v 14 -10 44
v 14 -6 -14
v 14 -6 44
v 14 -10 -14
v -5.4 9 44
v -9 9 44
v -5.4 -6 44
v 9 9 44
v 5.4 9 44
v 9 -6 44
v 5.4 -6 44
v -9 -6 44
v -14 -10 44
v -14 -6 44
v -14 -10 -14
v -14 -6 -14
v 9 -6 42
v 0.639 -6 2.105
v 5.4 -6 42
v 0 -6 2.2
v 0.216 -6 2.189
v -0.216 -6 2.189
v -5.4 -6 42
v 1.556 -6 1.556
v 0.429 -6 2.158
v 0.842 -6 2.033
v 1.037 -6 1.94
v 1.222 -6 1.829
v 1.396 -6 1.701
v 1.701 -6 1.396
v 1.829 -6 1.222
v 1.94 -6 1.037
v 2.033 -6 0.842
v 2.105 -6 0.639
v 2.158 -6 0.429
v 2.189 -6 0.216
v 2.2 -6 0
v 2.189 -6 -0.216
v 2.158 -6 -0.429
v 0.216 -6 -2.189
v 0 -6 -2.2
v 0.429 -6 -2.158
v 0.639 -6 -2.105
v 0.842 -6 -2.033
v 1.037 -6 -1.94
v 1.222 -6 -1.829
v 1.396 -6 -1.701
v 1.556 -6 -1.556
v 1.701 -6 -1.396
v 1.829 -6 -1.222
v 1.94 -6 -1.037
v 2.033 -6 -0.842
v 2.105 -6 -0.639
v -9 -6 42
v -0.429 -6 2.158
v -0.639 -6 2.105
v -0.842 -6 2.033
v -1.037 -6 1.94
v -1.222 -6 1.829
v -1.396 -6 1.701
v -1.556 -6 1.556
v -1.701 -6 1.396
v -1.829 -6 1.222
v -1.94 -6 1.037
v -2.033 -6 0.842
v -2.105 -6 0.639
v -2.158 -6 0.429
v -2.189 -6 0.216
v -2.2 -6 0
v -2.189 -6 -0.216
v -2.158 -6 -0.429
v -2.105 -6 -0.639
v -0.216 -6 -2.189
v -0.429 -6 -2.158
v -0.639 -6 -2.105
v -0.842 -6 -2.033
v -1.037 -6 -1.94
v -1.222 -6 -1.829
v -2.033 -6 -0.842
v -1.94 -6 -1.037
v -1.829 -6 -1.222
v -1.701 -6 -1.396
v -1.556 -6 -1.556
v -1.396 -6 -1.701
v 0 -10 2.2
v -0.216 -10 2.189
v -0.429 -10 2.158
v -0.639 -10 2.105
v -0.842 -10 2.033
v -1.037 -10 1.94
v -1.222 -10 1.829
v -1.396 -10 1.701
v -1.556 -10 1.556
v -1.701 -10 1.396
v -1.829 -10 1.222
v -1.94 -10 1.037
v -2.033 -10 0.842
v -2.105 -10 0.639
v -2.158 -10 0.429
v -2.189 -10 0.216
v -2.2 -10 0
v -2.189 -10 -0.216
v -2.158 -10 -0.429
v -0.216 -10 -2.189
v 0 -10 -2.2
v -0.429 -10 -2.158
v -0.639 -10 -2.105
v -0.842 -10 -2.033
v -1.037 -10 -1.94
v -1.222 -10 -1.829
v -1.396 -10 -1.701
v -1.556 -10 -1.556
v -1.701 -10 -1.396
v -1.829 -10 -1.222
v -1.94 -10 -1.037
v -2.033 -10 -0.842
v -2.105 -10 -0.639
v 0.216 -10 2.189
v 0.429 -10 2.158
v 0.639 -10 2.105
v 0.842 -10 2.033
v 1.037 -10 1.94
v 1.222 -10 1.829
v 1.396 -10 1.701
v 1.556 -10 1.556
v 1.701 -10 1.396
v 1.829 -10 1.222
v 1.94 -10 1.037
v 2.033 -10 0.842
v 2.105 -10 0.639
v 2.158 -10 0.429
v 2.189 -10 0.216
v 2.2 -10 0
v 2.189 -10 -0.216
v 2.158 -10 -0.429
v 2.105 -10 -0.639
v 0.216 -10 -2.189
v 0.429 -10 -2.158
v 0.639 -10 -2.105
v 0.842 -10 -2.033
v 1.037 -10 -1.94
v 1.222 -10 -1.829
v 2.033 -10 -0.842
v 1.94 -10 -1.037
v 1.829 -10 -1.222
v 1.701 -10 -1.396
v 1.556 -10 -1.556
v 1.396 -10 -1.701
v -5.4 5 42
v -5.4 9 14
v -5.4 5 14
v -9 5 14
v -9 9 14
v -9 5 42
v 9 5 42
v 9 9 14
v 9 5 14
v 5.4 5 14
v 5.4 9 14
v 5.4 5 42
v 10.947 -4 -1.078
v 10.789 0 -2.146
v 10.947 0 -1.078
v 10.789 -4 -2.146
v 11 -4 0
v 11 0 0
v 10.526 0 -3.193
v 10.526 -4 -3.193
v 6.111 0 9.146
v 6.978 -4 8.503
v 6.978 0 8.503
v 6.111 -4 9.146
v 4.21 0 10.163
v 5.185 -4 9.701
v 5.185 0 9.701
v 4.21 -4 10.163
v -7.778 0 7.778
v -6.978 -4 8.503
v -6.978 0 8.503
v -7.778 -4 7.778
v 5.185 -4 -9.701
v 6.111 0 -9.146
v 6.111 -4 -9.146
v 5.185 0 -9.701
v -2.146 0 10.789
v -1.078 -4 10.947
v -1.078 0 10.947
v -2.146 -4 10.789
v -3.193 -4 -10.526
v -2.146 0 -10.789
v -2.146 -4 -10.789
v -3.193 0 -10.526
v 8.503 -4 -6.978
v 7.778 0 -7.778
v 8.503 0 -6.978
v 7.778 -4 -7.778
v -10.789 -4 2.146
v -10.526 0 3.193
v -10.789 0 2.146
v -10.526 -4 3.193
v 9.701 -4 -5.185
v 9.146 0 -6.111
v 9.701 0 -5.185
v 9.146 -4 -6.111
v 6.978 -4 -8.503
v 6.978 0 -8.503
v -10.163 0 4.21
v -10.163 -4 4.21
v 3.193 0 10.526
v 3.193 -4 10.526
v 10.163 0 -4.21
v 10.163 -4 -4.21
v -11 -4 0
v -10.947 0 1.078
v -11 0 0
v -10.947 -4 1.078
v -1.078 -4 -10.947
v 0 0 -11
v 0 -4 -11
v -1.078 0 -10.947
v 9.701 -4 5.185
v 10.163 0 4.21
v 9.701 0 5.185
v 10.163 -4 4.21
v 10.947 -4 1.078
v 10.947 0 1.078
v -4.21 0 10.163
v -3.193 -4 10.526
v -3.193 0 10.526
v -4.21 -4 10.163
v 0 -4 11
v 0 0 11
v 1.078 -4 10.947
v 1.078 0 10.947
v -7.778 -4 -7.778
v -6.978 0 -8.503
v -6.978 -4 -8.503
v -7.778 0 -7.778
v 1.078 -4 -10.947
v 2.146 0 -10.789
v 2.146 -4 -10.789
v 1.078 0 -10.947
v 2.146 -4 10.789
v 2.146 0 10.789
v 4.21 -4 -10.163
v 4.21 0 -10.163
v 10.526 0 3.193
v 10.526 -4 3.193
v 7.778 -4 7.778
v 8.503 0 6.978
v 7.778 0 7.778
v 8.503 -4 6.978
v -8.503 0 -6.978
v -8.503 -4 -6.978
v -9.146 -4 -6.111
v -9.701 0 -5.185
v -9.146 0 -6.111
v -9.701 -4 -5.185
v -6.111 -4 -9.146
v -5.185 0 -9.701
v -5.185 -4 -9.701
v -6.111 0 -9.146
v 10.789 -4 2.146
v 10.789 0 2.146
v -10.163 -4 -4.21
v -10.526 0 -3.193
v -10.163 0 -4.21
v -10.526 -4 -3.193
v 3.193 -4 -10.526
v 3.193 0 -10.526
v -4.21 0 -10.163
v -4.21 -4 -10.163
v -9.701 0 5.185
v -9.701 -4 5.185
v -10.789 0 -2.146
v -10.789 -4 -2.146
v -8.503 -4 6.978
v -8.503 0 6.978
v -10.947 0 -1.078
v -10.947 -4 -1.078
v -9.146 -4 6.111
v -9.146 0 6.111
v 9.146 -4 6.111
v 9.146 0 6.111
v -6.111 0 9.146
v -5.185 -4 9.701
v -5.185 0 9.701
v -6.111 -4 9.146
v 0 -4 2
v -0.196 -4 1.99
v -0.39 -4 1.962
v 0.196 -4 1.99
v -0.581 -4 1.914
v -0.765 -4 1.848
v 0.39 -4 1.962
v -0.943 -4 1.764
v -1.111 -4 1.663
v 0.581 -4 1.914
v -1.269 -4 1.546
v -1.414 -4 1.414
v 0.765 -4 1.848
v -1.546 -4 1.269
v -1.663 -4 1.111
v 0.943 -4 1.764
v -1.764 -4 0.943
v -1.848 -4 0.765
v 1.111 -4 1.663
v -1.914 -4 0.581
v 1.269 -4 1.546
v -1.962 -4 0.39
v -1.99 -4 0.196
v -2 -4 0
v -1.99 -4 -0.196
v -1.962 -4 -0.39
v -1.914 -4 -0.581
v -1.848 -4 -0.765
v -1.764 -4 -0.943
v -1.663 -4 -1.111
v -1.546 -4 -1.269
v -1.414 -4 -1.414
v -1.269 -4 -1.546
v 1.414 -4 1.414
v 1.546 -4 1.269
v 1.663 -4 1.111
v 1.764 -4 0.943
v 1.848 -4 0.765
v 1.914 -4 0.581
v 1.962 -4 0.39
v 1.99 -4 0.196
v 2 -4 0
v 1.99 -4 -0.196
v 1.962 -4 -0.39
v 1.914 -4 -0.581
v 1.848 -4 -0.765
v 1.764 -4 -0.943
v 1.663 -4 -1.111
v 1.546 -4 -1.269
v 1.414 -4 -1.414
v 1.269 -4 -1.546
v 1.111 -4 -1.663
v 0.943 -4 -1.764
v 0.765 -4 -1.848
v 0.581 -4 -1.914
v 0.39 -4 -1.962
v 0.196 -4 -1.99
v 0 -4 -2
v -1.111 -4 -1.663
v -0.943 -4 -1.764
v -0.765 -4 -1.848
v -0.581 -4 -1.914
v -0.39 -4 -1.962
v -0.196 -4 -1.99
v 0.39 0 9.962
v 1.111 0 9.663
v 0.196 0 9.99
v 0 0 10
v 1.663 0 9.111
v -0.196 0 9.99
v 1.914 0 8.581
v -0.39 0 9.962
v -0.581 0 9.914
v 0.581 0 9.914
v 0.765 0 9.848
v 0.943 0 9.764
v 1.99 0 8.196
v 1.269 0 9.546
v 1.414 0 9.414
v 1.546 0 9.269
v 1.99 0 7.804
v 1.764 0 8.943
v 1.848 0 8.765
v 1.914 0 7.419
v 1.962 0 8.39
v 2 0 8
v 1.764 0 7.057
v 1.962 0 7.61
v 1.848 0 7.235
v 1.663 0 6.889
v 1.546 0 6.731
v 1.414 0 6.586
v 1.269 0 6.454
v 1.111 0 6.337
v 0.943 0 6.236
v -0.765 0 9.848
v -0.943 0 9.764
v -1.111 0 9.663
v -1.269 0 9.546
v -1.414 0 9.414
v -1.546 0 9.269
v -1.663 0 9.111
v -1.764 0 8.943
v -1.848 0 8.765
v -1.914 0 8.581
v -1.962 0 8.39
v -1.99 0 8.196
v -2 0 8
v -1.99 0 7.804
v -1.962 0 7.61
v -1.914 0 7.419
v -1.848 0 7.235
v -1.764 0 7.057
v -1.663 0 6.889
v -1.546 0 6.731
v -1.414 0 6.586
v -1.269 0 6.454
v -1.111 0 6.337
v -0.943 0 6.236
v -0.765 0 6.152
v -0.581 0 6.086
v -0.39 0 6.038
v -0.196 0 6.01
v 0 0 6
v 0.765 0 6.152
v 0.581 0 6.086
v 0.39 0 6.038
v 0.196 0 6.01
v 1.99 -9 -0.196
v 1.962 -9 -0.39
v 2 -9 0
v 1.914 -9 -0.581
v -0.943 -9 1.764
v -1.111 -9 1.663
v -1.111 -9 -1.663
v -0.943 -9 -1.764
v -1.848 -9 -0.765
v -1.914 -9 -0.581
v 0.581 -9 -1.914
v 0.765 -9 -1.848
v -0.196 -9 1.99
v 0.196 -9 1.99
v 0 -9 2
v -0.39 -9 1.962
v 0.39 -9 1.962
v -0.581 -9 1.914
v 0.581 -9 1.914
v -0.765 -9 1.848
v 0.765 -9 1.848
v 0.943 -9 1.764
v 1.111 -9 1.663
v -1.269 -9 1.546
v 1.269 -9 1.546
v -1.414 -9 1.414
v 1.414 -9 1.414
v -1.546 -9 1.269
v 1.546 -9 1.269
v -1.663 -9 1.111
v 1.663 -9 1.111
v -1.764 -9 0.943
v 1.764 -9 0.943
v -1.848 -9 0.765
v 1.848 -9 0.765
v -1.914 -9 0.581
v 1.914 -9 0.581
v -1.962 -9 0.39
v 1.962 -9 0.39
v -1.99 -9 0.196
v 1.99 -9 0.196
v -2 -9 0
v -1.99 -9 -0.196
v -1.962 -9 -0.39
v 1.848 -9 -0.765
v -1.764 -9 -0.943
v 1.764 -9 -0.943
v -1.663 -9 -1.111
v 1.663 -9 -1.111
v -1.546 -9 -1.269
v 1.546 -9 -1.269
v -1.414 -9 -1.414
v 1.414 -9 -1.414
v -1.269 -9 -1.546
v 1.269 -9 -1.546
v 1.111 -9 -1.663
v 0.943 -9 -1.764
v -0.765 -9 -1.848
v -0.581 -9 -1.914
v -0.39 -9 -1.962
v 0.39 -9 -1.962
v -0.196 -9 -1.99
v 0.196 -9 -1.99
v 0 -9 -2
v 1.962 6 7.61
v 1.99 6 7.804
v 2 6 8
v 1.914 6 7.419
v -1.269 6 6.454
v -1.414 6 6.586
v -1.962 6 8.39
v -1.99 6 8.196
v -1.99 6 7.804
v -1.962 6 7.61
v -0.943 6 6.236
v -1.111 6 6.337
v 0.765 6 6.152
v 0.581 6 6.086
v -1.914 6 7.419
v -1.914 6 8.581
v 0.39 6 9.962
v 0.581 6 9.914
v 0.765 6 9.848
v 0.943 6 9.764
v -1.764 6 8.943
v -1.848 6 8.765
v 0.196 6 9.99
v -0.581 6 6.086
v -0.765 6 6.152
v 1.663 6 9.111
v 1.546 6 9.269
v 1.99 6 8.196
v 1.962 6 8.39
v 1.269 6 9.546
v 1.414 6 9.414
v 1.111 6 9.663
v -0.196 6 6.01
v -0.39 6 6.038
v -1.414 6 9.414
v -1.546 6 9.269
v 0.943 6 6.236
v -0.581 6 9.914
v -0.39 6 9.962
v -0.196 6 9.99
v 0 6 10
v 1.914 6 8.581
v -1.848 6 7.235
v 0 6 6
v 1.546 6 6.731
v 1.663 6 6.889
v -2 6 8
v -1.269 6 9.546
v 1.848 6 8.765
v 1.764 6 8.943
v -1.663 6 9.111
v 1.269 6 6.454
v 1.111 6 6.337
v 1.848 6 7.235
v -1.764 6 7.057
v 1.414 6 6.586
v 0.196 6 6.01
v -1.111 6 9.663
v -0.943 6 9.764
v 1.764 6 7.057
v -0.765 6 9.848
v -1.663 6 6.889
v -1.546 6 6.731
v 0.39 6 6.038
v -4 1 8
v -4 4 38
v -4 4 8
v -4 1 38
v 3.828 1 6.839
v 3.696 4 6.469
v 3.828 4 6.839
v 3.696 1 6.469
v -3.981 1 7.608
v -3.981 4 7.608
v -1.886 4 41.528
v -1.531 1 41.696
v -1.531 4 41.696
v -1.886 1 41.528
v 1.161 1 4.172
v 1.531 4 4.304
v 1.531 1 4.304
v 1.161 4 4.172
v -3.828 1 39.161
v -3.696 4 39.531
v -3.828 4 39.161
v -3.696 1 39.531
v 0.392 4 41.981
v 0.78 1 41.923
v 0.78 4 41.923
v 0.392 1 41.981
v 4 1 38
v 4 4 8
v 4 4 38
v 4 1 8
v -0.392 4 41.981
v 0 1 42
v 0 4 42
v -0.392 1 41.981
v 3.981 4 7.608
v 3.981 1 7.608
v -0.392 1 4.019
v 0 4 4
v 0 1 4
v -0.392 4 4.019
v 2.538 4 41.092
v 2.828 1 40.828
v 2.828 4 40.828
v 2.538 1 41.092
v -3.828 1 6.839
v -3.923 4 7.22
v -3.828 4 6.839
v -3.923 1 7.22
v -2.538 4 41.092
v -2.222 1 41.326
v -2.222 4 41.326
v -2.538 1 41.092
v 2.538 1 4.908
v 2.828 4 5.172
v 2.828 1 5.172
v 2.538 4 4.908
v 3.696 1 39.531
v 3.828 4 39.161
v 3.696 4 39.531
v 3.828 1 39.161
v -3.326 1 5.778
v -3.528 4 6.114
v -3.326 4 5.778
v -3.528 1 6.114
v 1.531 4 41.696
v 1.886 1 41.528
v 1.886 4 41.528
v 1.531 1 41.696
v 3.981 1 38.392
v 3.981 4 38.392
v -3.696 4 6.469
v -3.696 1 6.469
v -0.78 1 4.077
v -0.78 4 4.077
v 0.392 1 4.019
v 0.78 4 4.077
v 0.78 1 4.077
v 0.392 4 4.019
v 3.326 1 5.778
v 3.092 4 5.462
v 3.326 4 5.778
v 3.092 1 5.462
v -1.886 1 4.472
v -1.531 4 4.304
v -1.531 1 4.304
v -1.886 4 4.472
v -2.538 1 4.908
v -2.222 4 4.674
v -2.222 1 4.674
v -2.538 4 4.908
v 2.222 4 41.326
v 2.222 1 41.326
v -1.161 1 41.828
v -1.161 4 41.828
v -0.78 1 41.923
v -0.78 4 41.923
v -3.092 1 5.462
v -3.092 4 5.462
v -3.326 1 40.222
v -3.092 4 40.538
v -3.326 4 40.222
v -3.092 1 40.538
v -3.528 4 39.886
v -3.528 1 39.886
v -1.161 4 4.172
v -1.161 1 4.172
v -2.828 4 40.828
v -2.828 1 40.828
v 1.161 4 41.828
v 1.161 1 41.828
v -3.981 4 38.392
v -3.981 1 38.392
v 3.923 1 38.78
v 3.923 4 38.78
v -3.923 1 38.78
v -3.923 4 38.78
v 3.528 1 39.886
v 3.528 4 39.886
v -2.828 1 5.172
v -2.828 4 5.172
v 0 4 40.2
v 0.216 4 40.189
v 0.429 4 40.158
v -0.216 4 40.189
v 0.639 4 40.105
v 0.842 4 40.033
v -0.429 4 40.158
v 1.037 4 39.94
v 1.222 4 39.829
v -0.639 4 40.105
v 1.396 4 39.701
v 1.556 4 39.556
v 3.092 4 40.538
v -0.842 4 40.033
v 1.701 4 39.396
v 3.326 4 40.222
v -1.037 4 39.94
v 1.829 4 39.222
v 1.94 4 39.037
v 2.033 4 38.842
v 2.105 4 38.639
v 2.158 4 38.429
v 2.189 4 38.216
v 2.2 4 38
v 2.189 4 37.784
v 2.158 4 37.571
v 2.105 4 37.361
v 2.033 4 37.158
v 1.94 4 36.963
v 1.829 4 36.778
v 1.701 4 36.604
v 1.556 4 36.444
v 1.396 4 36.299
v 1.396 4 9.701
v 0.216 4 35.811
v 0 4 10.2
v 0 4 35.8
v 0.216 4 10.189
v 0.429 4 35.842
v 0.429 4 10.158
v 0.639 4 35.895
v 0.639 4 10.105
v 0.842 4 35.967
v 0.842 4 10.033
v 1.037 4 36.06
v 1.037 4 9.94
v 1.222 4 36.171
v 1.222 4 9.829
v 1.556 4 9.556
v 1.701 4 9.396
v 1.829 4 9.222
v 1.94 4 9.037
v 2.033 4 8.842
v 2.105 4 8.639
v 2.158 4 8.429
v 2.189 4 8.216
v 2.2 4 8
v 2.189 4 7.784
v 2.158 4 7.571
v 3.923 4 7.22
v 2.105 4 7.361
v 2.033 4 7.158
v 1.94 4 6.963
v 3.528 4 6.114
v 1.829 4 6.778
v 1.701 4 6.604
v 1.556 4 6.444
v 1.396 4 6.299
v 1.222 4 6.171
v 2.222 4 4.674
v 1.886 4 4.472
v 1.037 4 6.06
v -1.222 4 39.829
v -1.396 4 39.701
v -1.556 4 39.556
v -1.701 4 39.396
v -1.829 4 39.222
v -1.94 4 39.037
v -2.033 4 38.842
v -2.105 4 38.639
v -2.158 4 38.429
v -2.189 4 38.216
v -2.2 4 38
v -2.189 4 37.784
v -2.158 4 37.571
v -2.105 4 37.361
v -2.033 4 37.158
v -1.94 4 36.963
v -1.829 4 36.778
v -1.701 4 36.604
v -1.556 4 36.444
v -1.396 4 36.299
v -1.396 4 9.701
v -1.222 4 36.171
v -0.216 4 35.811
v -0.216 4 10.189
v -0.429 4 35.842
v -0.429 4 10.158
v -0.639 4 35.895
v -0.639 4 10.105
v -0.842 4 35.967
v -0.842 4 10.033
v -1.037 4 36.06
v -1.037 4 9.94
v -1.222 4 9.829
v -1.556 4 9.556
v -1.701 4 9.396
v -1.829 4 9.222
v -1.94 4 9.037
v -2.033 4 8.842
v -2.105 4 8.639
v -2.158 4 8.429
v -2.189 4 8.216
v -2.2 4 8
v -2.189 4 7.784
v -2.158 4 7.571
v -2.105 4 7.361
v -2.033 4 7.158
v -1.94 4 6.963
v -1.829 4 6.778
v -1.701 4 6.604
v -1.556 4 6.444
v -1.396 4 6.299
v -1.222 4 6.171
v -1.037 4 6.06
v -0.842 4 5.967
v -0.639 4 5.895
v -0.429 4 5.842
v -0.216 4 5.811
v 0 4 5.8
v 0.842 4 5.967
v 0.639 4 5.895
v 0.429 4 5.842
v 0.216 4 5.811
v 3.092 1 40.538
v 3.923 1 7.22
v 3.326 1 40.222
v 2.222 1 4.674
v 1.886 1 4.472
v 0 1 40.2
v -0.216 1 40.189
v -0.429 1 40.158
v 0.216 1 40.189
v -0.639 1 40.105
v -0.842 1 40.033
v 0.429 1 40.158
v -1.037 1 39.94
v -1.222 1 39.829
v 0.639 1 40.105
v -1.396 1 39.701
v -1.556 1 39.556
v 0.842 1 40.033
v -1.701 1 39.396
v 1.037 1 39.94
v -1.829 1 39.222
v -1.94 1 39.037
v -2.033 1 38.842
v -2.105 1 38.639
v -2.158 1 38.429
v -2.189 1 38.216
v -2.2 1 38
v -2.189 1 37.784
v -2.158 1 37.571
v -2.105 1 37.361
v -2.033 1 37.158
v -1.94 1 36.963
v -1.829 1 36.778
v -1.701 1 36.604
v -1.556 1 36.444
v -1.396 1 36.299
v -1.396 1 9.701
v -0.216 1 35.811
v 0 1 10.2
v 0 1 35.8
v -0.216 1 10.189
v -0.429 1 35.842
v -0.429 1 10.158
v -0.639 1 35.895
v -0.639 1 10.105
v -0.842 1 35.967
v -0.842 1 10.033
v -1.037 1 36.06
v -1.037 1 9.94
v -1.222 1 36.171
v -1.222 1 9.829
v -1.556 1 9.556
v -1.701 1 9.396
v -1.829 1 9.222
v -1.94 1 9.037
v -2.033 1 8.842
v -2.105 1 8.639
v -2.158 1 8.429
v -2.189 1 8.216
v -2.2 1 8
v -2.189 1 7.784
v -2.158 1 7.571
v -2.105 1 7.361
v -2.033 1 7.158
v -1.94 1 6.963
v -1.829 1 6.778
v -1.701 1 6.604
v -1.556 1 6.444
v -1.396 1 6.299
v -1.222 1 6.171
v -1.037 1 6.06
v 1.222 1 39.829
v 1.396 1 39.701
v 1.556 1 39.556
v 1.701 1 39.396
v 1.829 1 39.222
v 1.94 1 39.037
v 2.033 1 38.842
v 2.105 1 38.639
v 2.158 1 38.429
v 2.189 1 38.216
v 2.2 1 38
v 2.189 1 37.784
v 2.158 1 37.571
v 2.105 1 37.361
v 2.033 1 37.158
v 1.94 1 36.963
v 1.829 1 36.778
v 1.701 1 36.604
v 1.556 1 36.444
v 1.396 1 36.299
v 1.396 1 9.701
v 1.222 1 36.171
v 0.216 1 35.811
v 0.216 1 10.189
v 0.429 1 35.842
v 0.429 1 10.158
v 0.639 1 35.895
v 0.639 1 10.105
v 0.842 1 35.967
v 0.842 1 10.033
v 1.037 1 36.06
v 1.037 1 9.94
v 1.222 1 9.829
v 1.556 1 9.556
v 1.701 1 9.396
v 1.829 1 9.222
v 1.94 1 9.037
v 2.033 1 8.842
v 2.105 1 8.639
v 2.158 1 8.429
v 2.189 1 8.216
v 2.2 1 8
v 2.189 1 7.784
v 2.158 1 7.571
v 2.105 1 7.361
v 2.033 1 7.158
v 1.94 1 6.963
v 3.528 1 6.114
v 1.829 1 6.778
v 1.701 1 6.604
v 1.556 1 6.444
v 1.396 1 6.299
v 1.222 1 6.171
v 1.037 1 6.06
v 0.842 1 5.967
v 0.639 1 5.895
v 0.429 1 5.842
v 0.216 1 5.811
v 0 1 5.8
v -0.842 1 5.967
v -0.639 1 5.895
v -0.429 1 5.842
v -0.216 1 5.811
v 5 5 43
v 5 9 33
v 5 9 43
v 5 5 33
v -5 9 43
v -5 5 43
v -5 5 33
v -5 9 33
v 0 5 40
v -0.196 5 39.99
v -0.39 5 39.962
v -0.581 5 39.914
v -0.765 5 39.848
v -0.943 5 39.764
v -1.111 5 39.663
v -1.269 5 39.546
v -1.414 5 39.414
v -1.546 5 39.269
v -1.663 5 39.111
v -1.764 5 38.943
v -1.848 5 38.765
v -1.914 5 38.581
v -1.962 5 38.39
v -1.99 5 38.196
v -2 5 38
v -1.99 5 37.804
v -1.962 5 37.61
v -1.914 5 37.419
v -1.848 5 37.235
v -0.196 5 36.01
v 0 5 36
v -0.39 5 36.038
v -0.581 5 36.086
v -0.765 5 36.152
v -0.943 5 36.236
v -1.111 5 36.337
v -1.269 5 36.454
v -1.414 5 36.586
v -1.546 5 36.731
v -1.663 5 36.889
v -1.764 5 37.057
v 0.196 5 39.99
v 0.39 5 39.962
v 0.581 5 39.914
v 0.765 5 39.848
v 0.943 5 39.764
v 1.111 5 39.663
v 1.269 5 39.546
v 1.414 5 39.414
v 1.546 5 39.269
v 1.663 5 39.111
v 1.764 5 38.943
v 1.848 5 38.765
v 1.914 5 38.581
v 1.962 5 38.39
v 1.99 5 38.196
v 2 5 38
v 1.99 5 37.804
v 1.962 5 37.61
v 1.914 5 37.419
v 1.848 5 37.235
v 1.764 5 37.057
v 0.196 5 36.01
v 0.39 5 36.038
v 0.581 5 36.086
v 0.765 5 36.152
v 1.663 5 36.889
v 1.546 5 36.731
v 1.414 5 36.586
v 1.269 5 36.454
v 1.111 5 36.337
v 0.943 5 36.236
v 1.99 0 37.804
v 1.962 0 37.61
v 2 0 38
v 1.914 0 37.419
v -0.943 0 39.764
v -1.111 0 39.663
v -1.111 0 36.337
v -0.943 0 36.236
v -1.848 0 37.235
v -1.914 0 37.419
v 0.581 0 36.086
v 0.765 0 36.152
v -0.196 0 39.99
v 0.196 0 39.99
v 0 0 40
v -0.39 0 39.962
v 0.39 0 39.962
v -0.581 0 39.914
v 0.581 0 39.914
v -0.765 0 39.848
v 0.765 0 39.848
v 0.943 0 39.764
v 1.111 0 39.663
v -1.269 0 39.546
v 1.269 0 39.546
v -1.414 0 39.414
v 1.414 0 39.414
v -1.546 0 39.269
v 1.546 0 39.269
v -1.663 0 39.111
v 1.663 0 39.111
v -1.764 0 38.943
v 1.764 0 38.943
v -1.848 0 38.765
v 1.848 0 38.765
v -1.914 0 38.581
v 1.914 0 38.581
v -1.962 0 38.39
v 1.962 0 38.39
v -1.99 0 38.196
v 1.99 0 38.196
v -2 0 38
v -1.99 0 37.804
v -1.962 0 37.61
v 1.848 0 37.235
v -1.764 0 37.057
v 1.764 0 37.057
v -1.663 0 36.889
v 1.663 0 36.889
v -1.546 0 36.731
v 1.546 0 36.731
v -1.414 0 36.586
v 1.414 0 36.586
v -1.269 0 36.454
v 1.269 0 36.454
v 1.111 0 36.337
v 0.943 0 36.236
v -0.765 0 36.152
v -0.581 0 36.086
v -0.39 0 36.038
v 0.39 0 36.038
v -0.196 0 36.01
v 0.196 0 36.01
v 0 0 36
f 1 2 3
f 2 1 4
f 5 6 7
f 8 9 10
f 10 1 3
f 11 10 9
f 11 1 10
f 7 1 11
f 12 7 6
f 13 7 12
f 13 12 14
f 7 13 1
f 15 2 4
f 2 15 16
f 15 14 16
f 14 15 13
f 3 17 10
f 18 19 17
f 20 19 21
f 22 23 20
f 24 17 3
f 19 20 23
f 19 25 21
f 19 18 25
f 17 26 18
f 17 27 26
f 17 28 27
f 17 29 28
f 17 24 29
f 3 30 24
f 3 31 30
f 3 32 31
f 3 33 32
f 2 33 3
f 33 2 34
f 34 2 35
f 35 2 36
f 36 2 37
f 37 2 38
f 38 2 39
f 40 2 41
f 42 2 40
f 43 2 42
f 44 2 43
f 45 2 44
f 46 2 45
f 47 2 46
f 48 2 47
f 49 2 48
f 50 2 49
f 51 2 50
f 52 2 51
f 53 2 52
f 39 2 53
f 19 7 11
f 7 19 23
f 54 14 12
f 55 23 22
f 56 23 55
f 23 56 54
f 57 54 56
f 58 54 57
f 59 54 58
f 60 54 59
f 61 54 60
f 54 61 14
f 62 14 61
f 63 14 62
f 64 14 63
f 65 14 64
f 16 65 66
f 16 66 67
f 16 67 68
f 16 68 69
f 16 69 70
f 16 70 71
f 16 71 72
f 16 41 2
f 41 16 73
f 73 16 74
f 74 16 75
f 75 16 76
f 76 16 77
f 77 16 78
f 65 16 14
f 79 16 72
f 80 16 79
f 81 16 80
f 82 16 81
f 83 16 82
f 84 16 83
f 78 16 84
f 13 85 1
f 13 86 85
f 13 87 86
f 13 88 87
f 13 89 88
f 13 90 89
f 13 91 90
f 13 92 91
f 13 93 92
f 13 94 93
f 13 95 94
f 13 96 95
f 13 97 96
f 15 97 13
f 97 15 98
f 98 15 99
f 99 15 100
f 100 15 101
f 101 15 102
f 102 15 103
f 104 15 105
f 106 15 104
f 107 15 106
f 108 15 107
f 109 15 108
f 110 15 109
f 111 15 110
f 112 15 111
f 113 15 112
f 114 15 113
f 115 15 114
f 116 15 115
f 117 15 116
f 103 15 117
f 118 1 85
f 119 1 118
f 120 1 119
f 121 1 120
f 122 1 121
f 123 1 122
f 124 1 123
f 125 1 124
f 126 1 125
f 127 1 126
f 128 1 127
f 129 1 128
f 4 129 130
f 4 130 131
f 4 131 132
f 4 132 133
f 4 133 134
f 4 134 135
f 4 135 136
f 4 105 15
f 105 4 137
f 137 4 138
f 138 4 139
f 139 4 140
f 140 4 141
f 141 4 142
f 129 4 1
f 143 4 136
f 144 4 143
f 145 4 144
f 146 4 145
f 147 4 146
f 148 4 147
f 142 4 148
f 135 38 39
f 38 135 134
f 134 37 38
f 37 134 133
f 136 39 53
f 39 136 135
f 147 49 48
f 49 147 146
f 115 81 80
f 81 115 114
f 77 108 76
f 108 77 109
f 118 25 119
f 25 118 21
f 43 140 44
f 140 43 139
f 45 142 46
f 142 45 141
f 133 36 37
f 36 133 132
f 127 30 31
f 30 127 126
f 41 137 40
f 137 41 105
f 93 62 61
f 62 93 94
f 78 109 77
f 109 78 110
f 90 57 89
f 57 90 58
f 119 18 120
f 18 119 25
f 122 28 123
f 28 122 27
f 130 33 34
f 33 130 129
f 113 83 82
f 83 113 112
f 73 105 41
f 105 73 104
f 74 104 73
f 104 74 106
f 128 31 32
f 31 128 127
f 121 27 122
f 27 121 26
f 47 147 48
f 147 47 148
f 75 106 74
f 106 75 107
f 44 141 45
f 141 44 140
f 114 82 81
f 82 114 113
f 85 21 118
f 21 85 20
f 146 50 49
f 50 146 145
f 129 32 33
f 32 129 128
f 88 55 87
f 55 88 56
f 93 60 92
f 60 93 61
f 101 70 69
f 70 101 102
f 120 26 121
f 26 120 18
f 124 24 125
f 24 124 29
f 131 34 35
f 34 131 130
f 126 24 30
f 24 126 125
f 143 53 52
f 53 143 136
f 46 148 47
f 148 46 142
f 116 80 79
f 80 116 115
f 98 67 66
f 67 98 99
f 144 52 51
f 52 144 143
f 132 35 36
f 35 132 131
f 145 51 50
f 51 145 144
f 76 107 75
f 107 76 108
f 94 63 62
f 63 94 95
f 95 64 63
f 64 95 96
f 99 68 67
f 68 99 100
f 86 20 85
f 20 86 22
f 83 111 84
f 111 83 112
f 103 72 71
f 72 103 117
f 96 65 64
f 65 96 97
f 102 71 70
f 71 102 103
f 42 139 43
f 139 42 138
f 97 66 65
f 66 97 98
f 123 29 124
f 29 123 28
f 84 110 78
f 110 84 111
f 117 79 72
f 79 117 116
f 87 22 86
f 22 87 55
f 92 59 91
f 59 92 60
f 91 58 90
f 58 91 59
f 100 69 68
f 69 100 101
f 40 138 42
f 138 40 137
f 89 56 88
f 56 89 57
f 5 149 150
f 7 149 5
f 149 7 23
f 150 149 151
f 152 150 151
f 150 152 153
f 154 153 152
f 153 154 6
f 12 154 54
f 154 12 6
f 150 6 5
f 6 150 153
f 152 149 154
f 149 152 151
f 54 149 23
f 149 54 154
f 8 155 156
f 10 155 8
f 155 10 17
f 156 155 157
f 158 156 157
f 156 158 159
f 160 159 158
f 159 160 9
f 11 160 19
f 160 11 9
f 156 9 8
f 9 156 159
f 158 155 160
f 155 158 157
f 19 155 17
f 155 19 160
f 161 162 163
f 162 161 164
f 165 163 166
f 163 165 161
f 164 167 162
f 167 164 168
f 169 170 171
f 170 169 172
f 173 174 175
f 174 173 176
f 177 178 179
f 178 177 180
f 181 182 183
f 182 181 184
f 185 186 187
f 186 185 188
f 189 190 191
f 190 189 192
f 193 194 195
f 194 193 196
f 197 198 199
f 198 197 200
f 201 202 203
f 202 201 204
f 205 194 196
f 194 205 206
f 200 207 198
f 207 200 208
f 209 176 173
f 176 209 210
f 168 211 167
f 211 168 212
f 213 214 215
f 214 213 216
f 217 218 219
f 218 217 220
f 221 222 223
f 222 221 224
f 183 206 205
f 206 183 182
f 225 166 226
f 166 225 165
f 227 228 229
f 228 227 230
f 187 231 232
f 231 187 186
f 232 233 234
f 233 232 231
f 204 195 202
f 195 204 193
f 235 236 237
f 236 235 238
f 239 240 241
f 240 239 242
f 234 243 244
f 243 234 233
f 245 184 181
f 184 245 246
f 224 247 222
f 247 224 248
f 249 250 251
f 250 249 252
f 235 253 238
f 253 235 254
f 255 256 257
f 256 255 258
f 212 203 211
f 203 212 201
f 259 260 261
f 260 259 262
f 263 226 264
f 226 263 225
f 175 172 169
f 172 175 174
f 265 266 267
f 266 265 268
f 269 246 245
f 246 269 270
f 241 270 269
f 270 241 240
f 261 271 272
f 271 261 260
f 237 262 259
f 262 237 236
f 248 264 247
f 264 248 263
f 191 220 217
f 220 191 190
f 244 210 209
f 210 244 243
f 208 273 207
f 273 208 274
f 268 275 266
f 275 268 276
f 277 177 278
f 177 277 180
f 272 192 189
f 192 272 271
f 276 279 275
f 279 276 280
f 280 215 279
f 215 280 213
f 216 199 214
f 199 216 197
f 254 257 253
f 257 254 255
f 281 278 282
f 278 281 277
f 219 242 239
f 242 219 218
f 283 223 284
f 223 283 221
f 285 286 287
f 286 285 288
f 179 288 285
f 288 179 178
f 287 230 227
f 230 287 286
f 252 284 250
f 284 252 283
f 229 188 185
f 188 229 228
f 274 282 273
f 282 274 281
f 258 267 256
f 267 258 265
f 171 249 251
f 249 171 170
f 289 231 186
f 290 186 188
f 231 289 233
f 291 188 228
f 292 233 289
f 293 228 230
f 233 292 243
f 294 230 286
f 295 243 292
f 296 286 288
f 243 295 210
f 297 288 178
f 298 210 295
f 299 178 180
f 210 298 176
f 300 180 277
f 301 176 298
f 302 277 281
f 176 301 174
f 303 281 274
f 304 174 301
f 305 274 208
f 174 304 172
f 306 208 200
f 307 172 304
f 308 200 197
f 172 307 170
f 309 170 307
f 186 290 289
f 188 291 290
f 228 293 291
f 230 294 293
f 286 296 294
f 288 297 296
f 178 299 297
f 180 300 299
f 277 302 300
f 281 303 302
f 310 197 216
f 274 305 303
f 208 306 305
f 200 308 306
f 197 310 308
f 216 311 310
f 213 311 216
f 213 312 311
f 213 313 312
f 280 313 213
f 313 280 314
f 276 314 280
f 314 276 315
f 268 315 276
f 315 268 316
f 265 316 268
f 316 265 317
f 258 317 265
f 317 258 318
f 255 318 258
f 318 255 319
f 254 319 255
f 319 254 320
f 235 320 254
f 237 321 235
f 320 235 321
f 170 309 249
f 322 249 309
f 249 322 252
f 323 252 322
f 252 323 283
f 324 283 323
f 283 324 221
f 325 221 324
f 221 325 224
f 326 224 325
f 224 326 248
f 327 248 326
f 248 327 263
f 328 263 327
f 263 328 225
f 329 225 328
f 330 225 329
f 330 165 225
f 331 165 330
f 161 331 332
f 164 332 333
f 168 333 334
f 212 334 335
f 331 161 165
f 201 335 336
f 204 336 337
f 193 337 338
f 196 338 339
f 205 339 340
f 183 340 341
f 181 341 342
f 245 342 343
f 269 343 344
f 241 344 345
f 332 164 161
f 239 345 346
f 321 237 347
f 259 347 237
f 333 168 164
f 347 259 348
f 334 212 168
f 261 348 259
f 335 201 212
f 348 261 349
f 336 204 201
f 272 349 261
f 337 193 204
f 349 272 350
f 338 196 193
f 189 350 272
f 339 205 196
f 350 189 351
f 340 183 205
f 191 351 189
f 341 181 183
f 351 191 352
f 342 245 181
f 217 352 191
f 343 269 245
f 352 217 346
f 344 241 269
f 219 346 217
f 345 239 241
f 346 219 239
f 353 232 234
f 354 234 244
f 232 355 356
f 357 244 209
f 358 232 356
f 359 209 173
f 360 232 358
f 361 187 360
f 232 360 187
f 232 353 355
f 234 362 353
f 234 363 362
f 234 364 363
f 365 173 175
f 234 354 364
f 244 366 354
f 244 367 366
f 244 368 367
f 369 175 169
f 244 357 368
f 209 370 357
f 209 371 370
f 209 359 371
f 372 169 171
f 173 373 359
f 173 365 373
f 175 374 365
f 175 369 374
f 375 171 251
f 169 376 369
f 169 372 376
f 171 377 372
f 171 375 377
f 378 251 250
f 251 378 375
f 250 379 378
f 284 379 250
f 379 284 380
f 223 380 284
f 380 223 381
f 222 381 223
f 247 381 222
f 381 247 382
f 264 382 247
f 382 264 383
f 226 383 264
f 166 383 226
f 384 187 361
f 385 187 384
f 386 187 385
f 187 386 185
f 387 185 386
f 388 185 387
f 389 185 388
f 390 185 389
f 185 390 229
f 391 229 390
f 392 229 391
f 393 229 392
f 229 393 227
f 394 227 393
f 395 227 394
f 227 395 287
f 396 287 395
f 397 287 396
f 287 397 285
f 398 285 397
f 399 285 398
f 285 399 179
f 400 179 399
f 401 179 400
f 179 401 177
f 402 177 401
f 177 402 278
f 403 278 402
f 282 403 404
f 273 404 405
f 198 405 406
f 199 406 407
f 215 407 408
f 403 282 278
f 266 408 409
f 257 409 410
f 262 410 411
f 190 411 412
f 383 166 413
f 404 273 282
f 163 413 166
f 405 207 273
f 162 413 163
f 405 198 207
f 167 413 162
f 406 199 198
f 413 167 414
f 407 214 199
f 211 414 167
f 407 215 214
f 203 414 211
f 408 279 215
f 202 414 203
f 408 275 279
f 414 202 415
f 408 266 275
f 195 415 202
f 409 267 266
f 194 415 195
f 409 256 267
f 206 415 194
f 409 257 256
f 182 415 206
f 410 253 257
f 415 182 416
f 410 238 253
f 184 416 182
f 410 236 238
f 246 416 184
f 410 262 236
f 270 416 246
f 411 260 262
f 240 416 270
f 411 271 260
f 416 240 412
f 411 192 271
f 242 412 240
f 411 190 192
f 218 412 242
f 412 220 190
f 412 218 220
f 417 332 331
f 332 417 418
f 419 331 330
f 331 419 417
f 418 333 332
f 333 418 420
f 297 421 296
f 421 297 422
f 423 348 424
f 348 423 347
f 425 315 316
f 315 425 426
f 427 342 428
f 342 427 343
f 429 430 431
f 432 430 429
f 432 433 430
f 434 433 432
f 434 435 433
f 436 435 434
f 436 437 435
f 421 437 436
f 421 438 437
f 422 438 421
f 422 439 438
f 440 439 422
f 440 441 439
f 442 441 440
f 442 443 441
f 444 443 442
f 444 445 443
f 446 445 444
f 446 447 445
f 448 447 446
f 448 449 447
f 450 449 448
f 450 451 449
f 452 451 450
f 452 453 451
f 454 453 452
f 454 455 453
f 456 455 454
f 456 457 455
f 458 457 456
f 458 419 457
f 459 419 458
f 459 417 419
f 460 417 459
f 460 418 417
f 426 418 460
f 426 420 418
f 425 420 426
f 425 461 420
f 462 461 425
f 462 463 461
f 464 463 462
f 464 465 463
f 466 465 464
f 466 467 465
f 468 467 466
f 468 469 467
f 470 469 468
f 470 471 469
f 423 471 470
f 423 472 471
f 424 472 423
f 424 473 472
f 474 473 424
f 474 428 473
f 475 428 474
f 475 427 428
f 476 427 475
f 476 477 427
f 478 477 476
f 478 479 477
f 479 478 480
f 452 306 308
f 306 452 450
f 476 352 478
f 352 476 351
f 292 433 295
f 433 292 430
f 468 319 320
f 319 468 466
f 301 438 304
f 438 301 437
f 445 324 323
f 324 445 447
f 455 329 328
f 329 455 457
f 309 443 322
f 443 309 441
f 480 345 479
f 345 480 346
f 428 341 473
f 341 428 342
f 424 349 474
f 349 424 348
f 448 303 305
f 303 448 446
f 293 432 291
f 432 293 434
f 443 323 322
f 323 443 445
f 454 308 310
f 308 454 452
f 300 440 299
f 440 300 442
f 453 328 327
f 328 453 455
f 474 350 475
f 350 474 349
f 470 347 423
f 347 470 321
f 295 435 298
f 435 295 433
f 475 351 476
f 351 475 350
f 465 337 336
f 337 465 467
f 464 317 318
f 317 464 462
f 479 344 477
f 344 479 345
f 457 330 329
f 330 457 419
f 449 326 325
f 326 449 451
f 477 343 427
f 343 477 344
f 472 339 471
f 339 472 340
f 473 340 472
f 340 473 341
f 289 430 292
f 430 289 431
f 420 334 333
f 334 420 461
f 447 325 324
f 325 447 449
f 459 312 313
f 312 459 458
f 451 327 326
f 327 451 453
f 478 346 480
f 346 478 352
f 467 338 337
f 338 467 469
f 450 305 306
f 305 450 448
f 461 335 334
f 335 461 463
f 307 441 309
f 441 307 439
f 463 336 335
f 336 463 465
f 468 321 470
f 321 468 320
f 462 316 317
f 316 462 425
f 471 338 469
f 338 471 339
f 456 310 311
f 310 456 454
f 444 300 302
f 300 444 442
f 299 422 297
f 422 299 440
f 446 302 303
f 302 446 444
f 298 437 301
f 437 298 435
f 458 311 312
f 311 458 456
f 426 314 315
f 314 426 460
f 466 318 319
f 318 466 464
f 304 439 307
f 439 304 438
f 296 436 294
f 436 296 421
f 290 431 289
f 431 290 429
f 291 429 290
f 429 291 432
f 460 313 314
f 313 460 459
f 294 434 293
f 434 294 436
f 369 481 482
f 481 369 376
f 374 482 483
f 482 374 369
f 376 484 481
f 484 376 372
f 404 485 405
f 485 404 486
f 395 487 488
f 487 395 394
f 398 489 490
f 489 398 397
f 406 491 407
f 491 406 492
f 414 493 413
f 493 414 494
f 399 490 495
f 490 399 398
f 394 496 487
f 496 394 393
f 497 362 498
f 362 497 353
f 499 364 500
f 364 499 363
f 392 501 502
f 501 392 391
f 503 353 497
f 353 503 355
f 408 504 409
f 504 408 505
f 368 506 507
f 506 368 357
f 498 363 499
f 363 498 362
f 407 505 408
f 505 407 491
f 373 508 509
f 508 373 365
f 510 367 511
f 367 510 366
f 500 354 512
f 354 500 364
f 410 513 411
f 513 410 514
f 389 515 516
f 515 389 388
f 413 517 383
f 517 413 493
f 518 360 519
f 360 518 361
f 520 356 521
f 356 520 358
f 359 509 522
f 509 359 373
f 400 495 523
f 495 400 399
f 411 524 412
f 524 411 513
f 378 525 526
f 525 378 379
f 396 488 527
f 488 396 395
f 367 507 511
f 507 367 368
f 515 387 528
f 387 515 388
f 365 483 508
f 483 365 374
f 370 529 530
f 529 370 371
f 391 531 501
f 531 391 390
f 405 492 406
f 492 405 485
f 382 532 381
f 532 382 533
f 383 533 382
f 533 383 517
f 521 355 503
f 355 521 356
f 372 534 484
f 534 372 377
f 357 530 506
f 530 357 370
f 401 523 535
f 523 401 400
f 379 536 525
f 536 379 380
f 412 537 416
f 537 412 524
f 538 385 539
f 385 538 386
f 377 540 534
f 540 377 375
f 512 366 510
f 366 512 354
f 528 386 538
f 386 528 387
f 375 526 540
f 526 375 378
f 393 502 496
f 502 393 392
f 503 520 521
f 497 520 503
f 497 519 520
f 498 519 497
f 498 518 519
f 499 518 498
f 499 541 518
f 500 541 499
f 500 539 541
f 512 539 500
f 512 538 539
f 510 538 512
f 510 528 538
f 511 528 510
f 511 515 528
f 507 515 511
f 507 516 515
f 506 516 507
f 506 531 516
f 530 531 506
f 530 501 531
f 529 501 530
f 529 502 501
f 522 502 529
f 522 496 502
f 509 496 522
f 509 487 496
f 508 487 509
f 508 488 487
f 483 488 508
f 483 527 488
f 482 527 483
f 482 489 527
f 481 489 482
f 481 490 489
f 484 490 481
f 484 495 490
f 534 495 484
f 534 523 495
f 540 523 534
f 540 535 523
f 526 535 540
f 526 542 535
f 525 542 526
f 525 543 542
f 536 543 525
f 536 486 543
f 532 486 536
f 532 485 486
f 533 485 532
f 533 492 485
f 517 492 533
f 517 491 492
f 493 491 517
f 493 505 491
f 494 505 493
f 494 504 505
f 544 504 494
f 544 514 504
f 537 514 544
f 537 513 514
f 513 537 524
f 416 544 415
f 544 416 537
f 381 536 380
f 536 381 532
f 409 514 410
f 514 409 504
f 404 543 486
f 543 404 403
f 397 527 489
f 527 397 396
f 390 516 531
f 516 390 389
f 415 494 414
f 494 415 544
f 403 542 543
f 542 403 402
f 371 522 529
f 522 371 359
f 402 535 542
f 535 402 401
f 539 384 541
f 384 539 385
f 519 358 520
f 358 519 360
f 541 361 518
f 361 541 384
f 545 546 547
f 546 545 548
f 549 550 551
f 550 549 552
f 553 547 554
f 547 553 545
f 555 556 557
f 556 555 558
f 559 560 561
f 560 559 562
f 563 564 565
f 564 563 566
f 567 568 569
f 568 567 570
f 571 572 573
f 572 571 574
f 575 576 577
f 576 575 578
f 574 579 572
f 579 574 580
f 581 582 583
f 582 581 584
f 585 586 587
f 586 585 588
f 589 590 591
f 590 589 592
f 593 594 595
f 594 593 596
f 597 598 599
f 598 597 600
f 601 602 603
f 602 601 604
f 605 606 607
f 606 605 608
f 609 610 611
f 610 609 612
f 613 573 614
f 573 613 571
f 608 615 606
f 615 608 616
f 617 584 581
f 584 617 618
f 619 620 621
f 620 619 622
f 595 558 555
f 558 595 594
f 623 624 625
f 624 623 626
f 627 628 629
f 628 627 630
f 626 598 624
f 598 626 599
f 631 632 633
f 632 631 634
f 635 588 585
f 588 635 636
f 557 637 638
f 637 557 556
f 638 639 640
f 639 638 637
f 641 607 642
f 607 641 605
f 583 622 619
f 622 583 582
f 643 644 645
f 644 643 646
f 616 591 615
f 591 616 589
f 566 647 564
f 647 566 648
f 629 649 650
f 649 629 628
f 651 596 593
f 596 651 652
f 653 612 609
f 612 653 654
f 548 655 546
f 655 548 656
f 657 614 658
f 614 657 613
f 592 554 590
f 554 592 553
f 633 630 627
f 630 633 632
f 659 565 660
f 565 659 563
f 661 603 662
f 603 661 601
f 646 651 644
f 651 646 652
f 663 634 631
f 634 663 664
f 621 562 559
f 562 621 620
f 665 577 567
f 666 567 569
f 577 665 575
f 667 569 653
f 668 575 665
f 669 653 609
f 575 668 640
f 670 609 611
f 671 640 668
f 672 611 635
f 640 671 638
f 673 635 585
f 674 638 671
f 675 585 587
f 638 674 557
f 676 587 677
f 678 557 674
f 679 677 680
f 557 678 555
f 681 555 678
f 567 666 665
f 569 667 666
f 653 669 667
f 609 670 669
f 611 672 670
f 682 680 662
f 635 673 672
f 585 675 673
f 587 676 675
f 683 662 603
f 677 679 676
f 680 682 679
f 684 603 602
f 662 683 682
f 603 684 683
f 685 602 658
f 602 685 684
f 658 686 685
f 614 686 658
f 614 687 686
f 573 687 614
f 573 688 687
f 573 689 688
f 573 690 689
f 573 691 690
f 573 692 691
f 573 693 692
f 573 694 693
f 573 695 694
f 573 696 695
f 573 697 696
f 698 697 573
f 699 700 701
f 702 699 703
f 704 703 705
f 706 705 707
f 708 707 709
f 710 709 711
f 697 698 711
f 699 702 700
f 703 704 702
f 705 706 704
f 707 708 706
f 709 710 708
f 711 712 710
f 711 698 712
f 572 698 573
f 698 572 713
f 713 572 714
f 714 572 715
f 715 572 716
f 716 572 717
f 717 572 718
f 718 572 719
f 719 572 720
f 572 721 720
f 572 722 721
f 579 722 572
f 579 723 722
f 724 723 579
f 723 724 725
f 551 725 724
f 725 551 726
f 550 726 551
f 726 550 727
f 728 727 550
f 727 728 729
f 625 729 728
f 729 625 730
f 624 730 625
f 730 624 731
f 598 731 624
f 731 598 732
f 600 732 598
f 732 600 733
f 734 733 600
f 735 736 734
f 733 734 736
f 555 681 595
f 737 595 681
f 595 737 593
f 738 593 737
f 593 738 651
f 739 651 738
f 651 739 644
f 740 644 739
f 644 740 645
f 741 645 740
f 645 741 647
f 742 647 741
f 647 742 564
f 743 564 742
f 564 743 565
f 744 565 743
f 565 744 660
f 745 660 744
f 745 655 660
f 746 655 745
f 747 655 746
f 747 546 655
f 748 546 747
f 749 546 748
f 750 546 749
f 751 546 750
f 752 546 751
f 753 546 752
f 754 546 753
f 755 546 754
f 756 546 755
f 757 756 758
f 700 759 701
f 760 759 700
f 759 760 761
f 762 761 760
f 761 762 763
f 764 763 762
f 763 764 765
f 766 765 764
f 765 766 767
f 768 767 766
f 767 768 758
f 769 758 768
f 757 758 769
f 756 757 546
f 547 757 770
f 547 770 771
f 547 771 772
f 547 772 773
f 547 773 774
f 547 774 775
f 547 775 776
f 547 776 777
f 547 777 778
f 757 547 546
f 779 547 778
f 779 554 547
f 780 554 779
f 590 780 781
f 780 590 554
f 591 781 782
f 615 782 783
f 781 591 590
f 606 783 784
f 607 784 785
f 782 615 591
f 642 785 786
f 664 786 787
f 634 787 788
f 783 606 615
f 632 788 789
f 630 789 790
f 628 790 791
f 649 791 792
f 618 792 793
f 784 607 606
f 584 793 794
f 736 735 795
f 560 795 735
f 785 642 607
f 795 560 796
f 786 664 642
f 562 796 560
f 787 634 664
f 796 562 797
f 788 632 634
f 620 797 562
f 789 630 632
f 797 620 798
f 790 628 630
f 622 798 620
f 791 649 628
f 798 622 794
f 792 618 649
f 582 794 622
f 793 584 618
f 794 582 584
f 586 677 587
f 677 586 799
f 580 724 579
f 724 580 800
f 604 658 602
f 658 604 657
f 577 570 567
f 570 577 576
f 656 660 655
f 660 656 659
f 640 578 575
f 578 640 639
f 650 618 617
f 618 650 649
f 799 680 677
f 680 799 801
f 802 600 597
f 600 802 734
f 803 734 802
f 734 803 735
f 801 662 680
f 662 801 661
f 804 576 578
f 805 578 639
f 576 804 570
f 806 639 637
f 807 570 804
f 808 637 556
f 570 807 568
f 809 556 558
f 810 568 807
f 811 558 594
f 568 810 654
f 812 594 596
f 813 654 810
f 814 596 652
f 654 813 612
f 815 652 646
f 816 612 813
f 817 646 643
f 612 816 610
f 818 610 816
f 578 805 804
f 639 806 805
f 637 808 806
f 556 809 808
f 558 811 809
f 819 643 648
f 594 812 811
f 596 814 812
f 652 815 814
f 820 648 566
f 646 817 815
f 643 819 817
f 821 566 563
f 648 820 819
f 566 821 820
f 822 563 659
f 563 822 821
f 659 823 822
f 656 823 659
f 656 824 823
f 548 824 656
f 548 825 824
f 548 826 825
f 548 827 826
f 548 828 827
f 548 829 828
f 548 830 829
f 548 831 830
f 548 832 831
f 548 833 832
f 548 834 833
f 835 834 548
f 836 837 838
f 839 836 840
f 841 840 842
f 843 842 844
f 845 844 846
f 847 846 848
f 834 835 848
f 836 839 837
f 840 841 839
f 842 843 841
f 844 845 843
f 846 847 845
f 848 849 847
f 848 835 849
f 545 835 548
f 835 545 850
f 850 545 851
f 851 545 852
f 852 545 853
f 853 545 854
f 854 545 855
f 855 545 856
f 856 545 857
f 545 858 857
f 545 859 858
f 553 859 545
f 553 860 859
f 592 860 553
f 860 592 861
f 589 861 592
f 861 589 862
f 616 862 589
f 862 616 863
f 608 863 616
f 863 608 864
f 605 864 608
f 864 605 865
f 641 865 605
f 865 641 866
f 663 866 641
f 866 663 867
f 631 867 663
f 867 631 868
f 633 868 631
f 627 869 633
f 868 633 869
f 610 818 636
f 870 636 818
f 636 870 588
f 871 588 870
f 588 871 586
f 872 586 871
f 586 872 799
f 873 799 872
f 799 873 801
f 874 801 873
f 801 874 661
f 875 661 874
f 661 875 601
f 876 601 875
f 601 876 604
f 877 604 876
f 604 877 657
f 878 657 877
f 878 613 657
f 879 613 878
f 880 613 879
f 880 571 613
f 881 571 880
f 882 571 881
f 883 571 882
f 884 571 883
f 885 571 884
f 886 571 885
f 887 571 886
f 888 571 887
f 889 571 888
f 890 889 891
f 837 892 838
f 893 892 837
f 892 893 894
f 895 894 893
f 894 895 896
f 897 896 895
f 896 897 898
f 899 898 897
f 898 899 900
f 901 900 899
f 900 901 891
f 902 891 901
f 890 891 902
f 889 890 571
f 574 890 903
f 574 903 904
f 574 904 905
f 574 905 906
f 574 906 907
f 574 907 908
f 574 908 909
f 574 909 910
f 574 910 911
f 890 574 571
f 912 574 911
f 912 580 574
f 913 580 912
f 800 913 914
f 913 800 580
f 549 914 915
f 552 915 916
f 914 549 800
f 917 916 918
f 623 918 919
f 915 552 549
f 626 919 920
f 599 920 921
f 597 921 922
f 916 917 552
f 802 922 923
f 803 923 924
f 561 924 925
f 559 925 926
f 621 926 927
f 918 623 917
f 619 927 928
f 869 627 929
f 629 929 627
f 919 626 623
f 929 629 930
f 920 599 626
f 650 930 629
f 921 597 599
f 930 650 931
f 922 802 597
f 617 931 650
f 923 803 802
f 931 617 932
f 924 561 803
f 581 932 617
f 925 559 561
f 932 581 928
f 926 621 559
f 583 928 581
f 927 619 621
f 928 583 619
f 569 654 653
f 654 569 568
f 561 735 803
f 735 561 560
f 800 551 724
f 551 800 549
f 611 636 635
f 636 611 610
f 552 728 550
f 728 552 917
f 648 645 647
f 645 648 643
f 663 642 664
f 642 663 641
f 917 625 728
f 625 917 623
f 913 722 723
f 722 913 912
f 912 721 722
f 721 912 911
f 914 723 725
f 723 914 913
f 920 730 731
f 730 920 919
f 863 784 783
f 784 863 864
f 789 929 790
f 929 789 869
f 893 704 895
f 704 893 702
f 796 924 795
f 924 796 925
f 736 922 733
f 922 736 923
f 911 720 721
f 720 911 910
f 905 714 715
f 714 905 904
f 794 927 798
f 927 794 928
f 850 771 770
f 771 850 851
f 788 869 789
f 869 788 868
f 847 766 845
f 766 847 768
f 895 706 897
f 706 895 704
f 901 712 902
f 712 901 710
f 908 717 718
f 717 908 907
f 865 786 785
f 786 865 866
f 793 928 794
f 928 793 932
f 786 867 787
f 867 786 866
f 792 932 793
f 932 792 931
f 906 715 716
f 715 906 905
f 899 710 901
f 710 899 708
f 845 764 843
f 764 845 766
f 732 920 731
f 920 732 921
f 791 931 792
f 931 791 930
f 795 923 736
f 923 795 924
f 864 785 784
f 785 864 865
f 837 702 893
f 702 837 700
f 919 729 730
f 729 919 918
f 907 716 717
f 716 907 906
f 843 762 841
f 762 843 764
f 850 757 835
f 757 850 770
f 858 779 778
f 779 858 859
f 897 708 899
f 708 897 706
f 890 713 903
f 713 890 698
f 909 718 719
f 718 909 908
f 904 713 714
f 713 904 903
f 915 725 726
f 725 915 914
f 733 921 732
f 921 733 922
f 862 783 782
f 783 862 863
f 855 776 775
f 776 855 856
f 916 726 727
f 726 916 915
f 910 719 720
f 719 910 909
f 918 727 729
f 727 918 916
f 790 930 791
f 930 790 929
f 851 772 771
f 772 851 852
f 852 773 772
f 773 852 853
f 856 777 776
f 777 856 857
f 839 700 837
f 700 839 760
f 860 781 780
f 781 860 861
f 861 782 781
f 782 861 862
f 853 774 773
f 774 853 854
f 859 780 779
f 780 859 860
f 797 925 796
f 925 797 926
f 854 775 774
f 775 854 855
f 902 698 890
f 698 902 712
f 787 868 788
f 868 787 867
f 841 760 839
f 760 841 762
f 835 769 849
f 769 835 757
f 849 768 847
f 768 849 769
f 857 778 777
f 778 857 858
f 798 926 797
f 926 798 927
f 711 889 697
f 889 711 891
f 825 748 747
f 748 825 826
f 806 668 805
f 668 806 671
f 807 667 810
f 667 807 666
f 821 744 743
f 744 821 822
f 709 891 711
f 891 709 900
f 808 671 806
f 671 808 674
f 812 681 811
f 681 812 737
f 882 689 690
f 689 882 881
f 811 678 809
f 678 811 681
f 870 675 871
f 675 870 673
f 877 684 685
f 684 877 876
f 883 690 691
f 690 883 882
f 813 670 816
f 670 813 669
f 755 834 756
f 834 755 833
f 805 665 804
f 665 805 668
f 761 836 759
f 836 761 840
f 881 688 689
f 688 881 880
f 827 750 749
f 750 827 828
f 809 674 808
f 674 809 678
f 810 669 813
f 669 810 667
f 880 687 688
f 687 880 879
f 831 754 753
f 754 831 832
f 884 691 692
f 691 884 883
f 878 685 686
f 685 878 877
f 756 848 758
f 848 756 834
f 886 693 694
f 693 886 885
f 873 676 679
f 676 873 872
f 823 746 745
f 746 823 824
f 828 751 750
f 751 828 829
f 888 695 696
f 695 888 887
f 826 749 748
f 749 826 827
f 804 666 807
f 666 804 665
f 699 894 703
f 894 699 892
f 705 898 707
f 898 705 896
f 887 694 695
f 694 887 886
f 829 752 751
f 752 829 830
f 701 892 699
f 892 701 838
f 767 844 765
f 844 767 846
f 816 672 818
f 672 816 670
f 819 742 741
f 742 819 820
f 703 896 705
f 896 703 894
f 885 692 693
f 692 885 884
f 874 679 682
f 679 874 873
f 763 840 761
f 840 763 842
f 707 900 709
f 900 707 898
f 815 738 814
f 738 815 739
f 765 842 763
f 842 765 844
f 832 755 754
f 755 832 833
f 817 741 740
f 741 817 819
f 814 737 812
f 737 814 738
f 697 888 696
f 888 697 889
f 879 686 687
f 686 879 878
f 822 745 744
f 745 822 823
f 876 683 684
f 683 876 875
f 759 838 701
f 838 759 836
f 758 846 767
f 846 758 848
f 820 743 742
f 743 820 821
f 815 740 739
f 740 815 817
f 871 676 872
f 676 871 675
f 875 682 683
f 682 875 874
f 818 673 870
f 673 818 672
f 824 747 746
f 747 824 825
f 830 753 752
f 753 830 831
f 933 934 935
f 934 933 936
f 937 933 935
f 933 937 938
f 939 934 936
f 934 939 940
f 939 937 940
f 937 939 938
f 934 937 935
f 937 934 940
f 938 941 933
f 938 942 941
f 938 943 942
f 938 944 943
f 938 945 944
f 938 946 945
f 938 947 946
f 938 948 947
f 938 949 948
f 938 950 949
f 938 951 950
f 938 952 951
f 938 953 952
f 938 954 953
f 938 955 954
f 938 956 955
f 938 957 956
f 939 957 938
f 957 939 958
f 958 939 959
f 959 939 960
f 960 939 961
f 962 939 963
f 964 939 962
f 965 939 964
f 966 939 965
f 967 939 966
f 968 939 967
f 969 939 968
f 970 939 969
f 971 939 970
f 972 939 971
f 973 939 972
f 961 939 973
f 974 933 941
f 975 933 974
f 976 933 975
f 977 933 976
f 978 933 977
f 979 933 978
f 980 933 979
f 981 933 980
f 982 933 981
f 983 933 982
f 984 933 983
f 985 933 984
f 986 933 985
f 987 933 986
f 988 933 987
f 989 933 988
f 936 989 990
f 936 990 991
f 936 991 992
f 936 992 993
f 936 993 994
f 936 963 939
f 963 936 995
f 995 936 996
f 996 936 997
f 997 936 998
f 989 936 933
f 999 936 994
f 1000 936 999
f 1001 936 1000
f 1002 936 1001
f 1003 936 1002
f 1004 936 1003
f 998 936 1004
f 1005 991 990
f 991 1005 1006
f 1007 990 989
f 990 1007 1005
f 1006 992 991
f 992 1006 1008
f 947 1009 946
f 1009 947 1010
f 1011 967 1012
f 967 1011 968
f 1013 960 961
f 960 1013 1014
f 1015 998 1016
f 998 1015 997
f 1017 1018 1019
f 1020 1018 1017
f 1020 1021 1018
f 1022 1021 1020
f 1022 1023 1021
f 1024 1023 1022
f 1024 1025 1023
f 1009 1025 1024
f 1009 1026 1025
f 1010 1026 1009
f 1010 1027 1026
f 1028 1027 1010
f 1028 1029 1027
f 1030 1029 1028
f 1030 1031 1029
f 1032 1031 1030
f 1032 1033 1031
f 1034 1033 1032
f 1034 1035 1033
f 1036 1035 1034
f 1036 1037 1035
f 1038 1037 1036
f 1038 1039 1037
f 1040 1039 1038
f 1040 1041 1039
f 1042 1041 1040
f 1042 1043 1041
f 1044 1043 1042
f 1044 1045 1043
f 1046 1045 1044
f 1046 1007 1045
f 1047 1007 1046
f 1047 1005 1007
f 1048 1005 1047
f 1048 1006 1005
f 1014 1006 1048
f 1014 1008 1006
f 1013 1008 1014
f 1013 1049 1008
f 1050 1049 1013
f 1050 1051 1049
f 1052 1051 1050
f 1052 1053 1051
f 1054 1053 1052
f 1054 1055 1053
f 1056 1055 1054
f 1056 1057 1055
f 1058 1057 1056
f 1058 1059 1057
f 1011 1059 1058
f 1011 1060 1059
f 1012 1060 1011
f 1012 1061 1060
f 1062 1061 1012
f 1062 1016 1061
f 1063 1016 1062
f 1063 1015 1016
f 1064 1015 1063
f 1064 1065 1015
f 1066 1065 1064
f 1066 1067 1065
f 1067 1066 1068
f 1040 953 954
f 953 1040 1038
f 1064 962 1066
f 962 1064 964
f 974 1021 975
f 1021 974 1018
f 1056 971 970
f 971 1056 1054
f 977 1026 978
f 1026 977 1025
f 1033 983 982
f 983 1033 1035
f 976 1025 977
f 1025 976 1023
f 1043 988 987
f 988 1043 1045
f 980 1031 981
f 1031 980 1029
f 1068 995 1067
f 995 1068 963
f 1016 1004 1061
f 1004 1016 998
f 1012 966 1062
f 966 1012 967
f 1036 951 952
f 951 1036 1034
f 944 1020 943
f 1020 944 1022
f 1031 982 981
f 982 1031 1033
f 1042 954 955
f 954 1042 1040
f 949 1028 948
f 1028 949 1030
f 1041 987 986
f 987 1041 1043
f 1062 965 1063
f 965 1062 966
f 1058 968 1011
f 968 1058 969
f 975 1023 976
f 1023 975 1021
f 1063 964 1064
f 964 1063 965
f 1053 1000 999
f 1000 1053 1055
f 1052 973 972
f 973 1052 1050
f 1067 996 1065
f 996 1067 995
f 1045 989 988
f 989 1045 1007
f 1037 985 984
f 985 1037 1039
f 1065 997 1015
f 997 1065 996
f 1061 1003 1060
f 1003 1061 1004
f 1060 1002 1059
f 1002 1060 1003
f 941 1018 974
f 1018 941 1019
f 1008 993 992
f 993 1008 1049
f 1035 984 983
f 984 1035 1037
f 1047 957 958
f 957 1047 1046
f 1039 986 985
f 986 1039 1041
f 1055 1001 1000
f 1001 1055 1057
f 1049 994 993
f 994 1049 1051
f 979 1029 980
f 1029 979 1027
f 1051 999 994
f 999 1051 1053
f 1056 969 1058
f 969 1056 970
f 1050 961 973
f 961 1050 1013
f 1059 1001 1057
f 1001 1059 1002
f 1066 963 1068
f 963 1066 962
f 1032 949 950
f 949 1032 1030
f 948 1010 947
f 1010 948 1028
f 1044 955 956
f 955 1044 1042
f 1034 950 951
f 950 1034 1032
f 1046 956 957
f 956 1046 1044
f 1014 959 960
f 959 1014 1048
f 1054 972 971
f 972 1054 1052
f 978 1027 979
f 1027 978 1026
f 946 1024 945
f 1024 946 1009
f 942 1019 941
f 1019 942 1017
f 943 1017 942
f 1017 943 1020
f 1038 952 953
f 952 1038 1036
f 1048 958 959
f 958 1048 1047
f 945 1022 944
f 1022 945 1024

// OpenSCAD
// Original low-speed slider-crank verification fixture, millimetres.
// Four manufacturing parts. Pins are integral; external axial retention is
// required. No load capacity, print tolerance or physical function is claimed.
agentscad_part = "all";
agentscad_pose = false;
motion_angle = 0;
crank_radius = 8;
rod_length = 30;
$fn = 64;

// All pin axes are parallel to +Y; the mechanism moves in the XZ plane.
module y_cylinder(radius, height) { rotate([-90, 0, 0]) cylinder(r=radius, h=height); }
module crank_local() {
  union() {
    translate([0, -4, 0]) y_cylinder(crank_radius + 3, 4);
    translate([0, -9, 0]) y_cylinder(2, 5.1);
    translate([0, -0.1, crank_radius]) y_cylinder(2, 6.1);
  }
}
module rod_local() {
  difference() {
    hull() {
      translate([0, 1, 0]) y_cylinder(4, 3);
      translate([0, 1, rod_length]) y_cylinder(4, 3);
    }
    translate([0, 0.9, 0]) y_cylinder(2.2, 3.2);
    translate([0, 0.9, rod_length]) y_cylinder(2.2, 3.2);
  }
}
module slider_local() {
  union() {
    translate([-5, 5, -5]) cube([10, 4, 10]);
    y_cylinder(2, 5.1);
  }
}
module frame_local() {
  union() {
    difference() {
      translate([-14, -10, -14]) cube([28, 4, 58]);
      translate([0, -10.1, 0]) y_cylinder(2.2, 4.2);
    }
    for (x = [-9, 5.4]) {
      translate([x, 5, 14]) cube([3.6, 4, 30]);
      translate([x, -6.1, 42]) cube([3.6, 11.2, 2]);
    }
  }
}

// Source-side construction. The checker measures the resulting mesh contours;
// it never consumes these functions or their computed coordinates as evidence.
cx = crank_radius * sin(motion_angle);
cz = crank_radius * cos(motion_angle);
travel = sqrt(rod_length * rod_length - cx * cx);
pz = cz + travel;
rod_angle = atan2(-cx, travel);
module selected_part(id, placed) {
  if (id == "frame") frame_local();
  if (id == "crank") rotate([0, placed ? motion_angle : 0, 0]) crank_local();
  if (id == "rod") translate(placed ? [cx, 0, cz] : [0, 0, 0])
    rotate([0, placed ? rod_angle : 0, 0]) rod_local();
  if (id == "slider") translate([0, 0, placed ? pz : 0]) slider_local();
}
module generated_part() {
  if (agentscad_part == "all") {
    for (id = ["frame", "crank", "rod", "slider"]) selected_part(id, true);
  } else selected_part(agentscad_part, agentscad_pose);
}
generated_part();
